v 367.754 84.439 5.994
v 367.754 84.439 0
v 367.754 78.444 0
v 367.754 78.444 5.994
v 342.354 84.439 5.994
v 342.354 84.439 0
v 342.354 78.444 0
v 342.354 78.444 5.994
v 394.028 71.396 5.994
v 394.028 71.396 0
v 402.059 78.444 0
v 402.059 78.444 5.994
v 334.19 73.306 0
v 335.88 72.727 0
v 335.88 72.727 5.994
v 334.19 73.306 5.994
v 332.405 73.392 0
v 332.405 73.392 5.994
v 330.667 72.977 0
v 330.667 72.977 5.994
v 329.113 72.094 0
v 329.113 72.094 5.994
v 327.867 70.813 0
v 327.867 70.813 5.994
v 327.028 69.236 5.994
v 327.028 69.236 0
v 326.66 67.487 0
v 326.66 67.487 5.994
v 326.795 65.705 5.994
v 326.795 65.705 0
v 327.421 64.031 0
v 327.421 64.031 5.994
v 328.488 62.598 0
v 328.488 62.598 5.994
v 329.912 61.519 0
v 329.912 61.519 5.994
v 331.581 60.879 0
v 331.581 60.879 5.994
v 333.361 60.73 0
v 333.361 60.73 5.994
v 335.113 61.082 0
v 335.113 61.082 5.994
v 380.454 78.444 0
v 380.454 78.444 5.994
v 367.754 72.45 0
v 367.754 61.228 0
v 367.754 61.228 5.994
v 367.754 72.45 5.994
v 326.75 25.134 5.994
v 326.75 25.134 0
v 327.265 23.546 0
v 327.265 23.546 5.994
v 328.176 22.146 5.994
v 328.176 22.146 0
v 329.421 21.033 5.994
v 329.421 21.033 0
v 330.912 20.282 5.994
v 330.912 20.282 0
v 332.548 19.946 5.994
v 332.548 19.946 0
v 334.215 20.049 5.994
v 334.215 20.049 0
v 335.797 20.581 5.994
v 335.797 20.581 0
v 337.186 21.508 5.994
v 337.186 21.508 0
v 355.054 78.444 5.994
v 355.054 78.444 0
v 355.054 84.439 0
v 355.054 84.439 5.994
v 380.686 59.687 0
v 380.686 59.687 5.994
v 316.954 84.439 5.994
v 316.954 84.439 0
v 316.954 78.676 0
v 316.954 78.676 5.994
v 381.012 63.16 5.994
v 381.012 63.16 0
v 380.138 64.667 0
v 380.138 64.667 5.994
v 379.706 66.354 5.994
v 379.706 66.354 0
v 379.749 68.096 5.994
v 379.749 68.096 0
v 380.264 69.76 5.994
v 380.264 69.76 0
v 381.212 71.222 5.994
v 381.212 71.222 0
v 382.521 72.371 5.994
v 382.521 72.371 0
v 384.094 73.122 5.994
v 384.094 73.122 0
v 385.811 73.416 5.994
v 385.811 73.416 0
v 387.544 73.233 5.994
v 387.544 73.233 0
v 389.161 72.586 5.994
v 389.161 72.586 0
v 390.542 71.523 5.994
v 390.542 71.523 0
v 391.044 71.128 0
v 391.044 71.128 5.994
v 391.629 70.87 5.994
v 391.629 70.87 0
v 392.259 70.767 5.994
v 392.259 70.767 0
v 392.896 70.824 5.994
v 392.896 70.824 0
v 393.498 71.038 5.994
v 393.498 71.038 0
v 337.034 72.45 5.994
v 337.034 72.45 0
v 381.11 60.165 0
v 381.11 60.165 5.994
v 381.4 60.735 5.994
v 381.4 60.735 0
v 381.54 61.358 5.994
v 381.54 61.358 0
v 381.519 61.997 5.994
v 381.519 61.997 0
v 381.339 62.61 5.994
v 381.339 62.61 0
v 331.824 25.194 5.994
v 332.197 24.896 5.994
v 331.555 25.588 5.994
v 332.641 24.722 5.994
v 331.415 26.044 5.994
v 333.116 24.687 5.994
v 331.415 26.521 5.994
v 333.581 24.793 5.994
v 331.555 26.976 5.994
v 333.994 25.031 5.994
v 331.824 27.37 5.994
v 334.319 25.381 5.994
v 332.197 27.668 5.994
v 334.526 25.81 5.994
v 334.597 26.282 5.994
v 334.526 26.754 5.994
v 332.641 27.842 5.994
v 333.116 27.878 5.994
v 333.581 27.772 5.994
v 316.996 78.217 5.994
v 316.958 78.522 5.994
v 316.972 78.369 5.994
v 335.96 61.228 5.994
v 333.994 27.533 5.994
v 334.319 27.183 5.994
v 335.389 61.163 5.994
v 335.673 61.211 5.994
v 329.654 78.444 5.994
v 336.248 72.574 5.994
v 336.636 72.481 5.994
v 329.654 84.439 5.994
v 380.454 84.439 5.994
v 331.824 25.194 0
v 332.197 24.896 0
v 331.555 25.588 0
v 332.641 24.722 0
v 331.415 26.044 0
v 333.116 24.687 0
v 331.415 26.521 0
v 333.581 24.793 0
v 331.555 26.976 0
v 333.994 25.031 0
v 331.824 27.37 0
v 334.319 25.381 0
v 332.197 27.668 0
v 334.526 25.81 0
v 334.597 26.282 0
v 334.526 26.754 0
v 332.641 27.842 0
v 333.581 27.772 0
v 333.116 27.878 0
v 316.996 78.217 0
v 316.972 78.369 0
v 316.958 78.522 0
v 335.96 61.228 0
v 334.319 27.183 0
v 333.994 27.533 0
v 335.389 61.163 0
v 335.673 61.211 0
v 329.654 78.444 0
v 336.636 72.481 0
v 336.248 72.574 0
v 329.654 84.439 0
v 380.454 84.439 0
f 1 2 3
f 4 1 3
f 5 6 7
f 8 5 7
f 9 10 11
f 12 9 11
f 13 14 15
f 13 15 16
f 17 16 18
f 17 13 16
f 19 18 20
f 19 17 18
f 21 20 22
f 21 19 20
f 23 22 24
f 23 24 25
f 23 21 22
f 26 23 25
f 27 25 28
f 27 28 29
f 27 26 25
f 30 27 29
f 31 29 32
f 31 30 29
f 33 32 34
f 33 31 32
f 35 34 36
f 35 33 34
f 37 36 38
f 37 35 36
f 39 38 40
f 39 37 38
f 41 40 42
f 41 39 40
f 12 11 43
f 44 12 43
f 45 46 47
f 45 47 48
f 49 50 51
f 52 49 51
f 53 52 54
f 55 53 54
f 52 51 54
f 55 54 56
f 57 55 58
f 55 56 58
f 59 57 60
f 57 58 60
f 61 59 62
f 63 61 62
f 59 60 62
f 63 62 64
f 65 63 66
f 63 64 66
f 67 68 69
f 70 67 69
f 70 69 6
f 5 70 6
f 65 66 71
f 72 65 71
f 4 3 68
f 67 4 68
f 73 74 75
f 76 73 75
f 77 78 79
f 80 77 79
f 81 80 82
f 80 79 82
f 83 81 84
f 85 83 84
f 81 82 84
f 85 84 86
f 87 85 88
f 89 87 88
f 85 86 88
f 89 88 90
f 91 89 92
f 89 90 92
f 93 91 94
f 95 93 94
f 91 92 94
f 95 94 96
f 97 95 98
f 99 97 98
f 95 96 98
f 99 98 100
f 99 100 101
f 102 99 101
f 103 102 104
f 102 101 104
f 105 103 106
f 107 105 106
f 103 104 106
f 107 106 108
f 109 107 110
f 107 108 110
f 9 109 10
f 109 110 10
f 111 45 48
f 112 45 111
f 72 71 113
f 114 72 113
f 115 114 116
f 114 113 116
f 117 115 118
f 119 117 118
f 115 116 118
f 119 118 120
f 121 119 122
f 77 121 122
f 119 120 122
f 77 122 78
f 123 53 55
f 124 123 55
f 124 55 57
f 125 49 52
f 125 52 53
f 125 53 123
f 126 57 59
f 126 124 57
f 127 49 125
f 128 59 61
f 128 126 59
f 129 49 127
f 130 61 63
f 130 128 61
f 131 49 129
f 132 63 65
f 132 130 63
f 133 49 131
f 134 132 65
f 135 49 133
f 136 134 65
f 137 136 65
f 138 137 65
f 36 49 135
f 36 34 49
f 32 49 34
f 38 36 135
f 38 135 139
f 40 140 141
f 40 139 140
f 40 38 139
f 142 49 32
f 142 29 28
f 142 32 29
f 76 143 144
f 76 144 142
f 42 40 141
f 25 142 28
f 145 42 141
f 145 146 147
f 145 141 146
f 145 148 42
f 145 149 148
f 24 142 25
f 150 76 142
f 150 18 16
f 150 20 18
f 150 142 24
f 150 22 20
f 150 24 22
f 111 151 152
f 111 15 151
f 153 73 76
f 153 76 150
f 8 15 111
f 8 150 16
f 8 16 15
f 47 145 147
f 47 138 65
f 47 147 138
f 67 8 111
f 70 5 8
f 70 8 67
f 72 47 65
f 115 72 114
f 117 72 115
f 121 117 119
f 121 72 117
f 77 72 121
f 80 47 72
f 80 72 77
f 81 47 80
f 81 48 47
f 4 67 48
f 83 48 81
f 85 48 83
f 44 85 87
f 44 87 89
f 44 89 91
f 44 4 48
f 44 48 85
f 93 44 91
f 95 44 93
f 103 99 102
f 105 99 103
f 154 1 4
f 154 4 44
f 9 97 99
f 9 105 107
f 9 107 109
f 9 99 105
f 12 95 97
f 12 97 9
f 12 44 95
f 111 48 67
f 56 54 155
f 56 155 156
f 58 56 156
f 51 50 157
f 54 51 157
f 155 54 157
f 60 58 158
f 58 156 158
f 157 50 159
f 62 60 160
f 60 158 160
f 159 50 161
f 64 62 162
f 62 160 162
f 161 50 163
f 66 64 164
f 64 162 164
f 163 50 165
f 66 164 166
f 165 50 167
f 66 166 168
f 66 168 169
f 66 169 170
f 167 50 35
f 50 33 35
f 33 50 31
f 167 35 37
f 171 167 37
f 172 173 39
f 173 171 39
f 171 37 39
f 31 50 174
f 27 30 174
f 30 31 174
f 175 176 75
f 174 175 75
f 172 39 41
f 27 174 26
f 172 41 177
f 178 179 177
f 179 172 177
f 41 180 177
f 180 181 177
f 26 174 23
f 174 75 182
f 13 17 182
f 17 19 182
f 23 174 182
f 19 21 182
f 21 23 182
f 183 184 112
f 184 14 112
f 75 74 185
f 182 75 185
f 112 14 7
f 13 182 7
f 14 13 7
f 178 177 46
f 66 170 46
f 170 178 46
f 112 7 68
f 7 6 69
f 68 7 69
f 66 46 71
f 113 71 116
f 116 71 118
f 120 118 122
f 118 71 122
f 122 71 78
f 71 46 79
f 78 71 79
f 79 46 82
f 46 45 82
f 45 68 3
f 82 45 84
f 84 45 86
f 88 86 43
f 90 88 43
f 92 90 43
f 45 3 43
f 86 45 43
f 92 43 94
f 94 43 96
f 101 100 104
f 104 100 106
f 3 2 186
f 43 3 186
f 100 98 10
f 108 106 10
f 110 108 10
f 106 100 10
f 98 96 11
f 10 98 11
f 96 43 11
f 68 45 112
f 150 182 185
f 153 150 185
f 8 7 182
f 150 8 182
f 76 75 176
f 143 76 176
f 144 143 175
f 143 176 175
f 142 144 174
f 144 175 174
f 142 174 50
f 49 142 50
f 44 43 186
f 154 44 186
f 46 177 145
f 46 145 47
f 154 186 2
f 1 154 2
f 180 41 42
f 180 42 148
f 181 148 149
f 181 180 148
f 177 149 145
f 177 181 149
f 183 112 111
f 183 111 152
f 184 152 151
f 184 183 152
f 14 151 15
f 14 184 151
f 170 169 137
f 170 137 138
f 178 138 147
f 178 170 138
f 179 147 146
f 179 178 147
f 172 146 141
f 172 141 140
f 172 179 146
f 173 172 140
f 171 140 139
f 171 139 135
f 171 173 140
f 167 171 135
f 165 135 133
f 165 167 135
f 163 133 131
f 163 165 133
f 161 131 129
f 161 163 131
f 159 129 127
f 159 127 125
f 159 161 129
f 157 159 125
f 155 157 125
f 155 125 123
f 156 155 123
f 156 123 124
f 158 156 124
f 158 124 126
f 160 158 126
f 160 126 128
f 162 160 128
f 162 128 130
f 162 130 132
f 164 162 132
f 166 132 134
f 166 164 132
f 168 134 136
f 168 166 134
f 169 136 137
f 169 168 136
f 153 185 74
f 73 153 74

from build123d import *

# Parameters (mm, degrees)
SKETCH1_R           = 1.6
BOSS_EXTRUDE1_DEPTH = 5.9944


with BuildPart() as part:
    # Sketch1 → Boss-Extrude1 (new body)
    with BuildSketch(Plane.XY):
        with BuildLine():
            Line((316.995622149, 78.216780382), (326.749772708, 25.13420903))
            ThreePointArc((326.749772708, 25.13420903), (330.912307442, 20.282357802), (337.186376688, 21.508412799))
            Line((337.186376688, 21.508412799), (380.686318009, 59.686636906))
            ThreePointArc((380.686318009, 59.686636906), (381.539726589, 61.358310991), (381.012274461, 63.159586846))
            ThreePointArc((381.012274461, 63.159586846), (381.827165591, 71.841961695), (390.541875435, 71.52335081))
            ThreePointArc((390.541875435, 71.52335081), (392.259481176, 70.76662697), (394.027759373, 71.395906456))
            Line((394.027759373, 71.395906456), (402.058752504, 78.4444))
            Line((402.058752504, 78.4444), (380.453796067, 78.4444))
            Line((380.453796067, 78.4444), (380.453796067, 84.4388))
            Line((380.453796067, 84.4388), (367.753796067, 84.4388))
            Line((367.753796067, 84.4388), (367.753796067, 78.4444))
            Line((367.753796067, 78.4444), (355.053796067, 78.4444))
            Line((355.053796067, 78.4444), (355.053796067, 84.4388))
            Line((355.053796067, 84.4388), (342.353796067, 84.4388))
            Line((342.353796067, 84.4388), (342.353796067, 78.4444))
            Line((342.353796067, 78.4444), (329.653796067, 78.4444))
            Line((329.653796067, 78.4444), (329.653796067, 84.4388))
            Line((329.653796067, 84.4388), (316.953796067, 84.4388))
            Line((316.953796067, 84.4388), (316.953796067, 78.675830573))
            ThreePointArc((316.953796067, 78.675830573), (316.9642742, 78.445354708), (316.995622149, 78.216780382))
        make_face()
        with Locations((332.996689228, 26.282106781)):
            Circle(SKETCH1_R, mode=Mode.SUBTRACT)
        with BuildLine():
            Line((339.346689286, 72.45), (337.033543957, 72.45))
            ThreePointArc((337.033543957, 72.45), (336.440455672, 72.520213312), (335.880156908, 72.726971429))
            ThreePointArc((335.880156908, 72.726971429), (326.660420383, 67.486768409), (335.113137596, 61.08248539))
            ThreePointArc((335.113137596, 61.08248539), (335.530243547, 61.19114772), (335.95971692, 61.227719546))
            Line((335.95971692, 61.227719546), (339.346689286, 61.227719546))
            Line((339.346689286, 61.227719546), (367.753796067, 61.227719546))
            Line((367.753796067, 61.227719546), (367.753796067, 72.45))
            Line((367.753796067, 72.45), (339.346689286, 72.45))
        make_face(mode=Mode.SUBTRACT)
    extrude(amount=BOSS_EXTRUDE1_DEPTH)


solid = part.part
